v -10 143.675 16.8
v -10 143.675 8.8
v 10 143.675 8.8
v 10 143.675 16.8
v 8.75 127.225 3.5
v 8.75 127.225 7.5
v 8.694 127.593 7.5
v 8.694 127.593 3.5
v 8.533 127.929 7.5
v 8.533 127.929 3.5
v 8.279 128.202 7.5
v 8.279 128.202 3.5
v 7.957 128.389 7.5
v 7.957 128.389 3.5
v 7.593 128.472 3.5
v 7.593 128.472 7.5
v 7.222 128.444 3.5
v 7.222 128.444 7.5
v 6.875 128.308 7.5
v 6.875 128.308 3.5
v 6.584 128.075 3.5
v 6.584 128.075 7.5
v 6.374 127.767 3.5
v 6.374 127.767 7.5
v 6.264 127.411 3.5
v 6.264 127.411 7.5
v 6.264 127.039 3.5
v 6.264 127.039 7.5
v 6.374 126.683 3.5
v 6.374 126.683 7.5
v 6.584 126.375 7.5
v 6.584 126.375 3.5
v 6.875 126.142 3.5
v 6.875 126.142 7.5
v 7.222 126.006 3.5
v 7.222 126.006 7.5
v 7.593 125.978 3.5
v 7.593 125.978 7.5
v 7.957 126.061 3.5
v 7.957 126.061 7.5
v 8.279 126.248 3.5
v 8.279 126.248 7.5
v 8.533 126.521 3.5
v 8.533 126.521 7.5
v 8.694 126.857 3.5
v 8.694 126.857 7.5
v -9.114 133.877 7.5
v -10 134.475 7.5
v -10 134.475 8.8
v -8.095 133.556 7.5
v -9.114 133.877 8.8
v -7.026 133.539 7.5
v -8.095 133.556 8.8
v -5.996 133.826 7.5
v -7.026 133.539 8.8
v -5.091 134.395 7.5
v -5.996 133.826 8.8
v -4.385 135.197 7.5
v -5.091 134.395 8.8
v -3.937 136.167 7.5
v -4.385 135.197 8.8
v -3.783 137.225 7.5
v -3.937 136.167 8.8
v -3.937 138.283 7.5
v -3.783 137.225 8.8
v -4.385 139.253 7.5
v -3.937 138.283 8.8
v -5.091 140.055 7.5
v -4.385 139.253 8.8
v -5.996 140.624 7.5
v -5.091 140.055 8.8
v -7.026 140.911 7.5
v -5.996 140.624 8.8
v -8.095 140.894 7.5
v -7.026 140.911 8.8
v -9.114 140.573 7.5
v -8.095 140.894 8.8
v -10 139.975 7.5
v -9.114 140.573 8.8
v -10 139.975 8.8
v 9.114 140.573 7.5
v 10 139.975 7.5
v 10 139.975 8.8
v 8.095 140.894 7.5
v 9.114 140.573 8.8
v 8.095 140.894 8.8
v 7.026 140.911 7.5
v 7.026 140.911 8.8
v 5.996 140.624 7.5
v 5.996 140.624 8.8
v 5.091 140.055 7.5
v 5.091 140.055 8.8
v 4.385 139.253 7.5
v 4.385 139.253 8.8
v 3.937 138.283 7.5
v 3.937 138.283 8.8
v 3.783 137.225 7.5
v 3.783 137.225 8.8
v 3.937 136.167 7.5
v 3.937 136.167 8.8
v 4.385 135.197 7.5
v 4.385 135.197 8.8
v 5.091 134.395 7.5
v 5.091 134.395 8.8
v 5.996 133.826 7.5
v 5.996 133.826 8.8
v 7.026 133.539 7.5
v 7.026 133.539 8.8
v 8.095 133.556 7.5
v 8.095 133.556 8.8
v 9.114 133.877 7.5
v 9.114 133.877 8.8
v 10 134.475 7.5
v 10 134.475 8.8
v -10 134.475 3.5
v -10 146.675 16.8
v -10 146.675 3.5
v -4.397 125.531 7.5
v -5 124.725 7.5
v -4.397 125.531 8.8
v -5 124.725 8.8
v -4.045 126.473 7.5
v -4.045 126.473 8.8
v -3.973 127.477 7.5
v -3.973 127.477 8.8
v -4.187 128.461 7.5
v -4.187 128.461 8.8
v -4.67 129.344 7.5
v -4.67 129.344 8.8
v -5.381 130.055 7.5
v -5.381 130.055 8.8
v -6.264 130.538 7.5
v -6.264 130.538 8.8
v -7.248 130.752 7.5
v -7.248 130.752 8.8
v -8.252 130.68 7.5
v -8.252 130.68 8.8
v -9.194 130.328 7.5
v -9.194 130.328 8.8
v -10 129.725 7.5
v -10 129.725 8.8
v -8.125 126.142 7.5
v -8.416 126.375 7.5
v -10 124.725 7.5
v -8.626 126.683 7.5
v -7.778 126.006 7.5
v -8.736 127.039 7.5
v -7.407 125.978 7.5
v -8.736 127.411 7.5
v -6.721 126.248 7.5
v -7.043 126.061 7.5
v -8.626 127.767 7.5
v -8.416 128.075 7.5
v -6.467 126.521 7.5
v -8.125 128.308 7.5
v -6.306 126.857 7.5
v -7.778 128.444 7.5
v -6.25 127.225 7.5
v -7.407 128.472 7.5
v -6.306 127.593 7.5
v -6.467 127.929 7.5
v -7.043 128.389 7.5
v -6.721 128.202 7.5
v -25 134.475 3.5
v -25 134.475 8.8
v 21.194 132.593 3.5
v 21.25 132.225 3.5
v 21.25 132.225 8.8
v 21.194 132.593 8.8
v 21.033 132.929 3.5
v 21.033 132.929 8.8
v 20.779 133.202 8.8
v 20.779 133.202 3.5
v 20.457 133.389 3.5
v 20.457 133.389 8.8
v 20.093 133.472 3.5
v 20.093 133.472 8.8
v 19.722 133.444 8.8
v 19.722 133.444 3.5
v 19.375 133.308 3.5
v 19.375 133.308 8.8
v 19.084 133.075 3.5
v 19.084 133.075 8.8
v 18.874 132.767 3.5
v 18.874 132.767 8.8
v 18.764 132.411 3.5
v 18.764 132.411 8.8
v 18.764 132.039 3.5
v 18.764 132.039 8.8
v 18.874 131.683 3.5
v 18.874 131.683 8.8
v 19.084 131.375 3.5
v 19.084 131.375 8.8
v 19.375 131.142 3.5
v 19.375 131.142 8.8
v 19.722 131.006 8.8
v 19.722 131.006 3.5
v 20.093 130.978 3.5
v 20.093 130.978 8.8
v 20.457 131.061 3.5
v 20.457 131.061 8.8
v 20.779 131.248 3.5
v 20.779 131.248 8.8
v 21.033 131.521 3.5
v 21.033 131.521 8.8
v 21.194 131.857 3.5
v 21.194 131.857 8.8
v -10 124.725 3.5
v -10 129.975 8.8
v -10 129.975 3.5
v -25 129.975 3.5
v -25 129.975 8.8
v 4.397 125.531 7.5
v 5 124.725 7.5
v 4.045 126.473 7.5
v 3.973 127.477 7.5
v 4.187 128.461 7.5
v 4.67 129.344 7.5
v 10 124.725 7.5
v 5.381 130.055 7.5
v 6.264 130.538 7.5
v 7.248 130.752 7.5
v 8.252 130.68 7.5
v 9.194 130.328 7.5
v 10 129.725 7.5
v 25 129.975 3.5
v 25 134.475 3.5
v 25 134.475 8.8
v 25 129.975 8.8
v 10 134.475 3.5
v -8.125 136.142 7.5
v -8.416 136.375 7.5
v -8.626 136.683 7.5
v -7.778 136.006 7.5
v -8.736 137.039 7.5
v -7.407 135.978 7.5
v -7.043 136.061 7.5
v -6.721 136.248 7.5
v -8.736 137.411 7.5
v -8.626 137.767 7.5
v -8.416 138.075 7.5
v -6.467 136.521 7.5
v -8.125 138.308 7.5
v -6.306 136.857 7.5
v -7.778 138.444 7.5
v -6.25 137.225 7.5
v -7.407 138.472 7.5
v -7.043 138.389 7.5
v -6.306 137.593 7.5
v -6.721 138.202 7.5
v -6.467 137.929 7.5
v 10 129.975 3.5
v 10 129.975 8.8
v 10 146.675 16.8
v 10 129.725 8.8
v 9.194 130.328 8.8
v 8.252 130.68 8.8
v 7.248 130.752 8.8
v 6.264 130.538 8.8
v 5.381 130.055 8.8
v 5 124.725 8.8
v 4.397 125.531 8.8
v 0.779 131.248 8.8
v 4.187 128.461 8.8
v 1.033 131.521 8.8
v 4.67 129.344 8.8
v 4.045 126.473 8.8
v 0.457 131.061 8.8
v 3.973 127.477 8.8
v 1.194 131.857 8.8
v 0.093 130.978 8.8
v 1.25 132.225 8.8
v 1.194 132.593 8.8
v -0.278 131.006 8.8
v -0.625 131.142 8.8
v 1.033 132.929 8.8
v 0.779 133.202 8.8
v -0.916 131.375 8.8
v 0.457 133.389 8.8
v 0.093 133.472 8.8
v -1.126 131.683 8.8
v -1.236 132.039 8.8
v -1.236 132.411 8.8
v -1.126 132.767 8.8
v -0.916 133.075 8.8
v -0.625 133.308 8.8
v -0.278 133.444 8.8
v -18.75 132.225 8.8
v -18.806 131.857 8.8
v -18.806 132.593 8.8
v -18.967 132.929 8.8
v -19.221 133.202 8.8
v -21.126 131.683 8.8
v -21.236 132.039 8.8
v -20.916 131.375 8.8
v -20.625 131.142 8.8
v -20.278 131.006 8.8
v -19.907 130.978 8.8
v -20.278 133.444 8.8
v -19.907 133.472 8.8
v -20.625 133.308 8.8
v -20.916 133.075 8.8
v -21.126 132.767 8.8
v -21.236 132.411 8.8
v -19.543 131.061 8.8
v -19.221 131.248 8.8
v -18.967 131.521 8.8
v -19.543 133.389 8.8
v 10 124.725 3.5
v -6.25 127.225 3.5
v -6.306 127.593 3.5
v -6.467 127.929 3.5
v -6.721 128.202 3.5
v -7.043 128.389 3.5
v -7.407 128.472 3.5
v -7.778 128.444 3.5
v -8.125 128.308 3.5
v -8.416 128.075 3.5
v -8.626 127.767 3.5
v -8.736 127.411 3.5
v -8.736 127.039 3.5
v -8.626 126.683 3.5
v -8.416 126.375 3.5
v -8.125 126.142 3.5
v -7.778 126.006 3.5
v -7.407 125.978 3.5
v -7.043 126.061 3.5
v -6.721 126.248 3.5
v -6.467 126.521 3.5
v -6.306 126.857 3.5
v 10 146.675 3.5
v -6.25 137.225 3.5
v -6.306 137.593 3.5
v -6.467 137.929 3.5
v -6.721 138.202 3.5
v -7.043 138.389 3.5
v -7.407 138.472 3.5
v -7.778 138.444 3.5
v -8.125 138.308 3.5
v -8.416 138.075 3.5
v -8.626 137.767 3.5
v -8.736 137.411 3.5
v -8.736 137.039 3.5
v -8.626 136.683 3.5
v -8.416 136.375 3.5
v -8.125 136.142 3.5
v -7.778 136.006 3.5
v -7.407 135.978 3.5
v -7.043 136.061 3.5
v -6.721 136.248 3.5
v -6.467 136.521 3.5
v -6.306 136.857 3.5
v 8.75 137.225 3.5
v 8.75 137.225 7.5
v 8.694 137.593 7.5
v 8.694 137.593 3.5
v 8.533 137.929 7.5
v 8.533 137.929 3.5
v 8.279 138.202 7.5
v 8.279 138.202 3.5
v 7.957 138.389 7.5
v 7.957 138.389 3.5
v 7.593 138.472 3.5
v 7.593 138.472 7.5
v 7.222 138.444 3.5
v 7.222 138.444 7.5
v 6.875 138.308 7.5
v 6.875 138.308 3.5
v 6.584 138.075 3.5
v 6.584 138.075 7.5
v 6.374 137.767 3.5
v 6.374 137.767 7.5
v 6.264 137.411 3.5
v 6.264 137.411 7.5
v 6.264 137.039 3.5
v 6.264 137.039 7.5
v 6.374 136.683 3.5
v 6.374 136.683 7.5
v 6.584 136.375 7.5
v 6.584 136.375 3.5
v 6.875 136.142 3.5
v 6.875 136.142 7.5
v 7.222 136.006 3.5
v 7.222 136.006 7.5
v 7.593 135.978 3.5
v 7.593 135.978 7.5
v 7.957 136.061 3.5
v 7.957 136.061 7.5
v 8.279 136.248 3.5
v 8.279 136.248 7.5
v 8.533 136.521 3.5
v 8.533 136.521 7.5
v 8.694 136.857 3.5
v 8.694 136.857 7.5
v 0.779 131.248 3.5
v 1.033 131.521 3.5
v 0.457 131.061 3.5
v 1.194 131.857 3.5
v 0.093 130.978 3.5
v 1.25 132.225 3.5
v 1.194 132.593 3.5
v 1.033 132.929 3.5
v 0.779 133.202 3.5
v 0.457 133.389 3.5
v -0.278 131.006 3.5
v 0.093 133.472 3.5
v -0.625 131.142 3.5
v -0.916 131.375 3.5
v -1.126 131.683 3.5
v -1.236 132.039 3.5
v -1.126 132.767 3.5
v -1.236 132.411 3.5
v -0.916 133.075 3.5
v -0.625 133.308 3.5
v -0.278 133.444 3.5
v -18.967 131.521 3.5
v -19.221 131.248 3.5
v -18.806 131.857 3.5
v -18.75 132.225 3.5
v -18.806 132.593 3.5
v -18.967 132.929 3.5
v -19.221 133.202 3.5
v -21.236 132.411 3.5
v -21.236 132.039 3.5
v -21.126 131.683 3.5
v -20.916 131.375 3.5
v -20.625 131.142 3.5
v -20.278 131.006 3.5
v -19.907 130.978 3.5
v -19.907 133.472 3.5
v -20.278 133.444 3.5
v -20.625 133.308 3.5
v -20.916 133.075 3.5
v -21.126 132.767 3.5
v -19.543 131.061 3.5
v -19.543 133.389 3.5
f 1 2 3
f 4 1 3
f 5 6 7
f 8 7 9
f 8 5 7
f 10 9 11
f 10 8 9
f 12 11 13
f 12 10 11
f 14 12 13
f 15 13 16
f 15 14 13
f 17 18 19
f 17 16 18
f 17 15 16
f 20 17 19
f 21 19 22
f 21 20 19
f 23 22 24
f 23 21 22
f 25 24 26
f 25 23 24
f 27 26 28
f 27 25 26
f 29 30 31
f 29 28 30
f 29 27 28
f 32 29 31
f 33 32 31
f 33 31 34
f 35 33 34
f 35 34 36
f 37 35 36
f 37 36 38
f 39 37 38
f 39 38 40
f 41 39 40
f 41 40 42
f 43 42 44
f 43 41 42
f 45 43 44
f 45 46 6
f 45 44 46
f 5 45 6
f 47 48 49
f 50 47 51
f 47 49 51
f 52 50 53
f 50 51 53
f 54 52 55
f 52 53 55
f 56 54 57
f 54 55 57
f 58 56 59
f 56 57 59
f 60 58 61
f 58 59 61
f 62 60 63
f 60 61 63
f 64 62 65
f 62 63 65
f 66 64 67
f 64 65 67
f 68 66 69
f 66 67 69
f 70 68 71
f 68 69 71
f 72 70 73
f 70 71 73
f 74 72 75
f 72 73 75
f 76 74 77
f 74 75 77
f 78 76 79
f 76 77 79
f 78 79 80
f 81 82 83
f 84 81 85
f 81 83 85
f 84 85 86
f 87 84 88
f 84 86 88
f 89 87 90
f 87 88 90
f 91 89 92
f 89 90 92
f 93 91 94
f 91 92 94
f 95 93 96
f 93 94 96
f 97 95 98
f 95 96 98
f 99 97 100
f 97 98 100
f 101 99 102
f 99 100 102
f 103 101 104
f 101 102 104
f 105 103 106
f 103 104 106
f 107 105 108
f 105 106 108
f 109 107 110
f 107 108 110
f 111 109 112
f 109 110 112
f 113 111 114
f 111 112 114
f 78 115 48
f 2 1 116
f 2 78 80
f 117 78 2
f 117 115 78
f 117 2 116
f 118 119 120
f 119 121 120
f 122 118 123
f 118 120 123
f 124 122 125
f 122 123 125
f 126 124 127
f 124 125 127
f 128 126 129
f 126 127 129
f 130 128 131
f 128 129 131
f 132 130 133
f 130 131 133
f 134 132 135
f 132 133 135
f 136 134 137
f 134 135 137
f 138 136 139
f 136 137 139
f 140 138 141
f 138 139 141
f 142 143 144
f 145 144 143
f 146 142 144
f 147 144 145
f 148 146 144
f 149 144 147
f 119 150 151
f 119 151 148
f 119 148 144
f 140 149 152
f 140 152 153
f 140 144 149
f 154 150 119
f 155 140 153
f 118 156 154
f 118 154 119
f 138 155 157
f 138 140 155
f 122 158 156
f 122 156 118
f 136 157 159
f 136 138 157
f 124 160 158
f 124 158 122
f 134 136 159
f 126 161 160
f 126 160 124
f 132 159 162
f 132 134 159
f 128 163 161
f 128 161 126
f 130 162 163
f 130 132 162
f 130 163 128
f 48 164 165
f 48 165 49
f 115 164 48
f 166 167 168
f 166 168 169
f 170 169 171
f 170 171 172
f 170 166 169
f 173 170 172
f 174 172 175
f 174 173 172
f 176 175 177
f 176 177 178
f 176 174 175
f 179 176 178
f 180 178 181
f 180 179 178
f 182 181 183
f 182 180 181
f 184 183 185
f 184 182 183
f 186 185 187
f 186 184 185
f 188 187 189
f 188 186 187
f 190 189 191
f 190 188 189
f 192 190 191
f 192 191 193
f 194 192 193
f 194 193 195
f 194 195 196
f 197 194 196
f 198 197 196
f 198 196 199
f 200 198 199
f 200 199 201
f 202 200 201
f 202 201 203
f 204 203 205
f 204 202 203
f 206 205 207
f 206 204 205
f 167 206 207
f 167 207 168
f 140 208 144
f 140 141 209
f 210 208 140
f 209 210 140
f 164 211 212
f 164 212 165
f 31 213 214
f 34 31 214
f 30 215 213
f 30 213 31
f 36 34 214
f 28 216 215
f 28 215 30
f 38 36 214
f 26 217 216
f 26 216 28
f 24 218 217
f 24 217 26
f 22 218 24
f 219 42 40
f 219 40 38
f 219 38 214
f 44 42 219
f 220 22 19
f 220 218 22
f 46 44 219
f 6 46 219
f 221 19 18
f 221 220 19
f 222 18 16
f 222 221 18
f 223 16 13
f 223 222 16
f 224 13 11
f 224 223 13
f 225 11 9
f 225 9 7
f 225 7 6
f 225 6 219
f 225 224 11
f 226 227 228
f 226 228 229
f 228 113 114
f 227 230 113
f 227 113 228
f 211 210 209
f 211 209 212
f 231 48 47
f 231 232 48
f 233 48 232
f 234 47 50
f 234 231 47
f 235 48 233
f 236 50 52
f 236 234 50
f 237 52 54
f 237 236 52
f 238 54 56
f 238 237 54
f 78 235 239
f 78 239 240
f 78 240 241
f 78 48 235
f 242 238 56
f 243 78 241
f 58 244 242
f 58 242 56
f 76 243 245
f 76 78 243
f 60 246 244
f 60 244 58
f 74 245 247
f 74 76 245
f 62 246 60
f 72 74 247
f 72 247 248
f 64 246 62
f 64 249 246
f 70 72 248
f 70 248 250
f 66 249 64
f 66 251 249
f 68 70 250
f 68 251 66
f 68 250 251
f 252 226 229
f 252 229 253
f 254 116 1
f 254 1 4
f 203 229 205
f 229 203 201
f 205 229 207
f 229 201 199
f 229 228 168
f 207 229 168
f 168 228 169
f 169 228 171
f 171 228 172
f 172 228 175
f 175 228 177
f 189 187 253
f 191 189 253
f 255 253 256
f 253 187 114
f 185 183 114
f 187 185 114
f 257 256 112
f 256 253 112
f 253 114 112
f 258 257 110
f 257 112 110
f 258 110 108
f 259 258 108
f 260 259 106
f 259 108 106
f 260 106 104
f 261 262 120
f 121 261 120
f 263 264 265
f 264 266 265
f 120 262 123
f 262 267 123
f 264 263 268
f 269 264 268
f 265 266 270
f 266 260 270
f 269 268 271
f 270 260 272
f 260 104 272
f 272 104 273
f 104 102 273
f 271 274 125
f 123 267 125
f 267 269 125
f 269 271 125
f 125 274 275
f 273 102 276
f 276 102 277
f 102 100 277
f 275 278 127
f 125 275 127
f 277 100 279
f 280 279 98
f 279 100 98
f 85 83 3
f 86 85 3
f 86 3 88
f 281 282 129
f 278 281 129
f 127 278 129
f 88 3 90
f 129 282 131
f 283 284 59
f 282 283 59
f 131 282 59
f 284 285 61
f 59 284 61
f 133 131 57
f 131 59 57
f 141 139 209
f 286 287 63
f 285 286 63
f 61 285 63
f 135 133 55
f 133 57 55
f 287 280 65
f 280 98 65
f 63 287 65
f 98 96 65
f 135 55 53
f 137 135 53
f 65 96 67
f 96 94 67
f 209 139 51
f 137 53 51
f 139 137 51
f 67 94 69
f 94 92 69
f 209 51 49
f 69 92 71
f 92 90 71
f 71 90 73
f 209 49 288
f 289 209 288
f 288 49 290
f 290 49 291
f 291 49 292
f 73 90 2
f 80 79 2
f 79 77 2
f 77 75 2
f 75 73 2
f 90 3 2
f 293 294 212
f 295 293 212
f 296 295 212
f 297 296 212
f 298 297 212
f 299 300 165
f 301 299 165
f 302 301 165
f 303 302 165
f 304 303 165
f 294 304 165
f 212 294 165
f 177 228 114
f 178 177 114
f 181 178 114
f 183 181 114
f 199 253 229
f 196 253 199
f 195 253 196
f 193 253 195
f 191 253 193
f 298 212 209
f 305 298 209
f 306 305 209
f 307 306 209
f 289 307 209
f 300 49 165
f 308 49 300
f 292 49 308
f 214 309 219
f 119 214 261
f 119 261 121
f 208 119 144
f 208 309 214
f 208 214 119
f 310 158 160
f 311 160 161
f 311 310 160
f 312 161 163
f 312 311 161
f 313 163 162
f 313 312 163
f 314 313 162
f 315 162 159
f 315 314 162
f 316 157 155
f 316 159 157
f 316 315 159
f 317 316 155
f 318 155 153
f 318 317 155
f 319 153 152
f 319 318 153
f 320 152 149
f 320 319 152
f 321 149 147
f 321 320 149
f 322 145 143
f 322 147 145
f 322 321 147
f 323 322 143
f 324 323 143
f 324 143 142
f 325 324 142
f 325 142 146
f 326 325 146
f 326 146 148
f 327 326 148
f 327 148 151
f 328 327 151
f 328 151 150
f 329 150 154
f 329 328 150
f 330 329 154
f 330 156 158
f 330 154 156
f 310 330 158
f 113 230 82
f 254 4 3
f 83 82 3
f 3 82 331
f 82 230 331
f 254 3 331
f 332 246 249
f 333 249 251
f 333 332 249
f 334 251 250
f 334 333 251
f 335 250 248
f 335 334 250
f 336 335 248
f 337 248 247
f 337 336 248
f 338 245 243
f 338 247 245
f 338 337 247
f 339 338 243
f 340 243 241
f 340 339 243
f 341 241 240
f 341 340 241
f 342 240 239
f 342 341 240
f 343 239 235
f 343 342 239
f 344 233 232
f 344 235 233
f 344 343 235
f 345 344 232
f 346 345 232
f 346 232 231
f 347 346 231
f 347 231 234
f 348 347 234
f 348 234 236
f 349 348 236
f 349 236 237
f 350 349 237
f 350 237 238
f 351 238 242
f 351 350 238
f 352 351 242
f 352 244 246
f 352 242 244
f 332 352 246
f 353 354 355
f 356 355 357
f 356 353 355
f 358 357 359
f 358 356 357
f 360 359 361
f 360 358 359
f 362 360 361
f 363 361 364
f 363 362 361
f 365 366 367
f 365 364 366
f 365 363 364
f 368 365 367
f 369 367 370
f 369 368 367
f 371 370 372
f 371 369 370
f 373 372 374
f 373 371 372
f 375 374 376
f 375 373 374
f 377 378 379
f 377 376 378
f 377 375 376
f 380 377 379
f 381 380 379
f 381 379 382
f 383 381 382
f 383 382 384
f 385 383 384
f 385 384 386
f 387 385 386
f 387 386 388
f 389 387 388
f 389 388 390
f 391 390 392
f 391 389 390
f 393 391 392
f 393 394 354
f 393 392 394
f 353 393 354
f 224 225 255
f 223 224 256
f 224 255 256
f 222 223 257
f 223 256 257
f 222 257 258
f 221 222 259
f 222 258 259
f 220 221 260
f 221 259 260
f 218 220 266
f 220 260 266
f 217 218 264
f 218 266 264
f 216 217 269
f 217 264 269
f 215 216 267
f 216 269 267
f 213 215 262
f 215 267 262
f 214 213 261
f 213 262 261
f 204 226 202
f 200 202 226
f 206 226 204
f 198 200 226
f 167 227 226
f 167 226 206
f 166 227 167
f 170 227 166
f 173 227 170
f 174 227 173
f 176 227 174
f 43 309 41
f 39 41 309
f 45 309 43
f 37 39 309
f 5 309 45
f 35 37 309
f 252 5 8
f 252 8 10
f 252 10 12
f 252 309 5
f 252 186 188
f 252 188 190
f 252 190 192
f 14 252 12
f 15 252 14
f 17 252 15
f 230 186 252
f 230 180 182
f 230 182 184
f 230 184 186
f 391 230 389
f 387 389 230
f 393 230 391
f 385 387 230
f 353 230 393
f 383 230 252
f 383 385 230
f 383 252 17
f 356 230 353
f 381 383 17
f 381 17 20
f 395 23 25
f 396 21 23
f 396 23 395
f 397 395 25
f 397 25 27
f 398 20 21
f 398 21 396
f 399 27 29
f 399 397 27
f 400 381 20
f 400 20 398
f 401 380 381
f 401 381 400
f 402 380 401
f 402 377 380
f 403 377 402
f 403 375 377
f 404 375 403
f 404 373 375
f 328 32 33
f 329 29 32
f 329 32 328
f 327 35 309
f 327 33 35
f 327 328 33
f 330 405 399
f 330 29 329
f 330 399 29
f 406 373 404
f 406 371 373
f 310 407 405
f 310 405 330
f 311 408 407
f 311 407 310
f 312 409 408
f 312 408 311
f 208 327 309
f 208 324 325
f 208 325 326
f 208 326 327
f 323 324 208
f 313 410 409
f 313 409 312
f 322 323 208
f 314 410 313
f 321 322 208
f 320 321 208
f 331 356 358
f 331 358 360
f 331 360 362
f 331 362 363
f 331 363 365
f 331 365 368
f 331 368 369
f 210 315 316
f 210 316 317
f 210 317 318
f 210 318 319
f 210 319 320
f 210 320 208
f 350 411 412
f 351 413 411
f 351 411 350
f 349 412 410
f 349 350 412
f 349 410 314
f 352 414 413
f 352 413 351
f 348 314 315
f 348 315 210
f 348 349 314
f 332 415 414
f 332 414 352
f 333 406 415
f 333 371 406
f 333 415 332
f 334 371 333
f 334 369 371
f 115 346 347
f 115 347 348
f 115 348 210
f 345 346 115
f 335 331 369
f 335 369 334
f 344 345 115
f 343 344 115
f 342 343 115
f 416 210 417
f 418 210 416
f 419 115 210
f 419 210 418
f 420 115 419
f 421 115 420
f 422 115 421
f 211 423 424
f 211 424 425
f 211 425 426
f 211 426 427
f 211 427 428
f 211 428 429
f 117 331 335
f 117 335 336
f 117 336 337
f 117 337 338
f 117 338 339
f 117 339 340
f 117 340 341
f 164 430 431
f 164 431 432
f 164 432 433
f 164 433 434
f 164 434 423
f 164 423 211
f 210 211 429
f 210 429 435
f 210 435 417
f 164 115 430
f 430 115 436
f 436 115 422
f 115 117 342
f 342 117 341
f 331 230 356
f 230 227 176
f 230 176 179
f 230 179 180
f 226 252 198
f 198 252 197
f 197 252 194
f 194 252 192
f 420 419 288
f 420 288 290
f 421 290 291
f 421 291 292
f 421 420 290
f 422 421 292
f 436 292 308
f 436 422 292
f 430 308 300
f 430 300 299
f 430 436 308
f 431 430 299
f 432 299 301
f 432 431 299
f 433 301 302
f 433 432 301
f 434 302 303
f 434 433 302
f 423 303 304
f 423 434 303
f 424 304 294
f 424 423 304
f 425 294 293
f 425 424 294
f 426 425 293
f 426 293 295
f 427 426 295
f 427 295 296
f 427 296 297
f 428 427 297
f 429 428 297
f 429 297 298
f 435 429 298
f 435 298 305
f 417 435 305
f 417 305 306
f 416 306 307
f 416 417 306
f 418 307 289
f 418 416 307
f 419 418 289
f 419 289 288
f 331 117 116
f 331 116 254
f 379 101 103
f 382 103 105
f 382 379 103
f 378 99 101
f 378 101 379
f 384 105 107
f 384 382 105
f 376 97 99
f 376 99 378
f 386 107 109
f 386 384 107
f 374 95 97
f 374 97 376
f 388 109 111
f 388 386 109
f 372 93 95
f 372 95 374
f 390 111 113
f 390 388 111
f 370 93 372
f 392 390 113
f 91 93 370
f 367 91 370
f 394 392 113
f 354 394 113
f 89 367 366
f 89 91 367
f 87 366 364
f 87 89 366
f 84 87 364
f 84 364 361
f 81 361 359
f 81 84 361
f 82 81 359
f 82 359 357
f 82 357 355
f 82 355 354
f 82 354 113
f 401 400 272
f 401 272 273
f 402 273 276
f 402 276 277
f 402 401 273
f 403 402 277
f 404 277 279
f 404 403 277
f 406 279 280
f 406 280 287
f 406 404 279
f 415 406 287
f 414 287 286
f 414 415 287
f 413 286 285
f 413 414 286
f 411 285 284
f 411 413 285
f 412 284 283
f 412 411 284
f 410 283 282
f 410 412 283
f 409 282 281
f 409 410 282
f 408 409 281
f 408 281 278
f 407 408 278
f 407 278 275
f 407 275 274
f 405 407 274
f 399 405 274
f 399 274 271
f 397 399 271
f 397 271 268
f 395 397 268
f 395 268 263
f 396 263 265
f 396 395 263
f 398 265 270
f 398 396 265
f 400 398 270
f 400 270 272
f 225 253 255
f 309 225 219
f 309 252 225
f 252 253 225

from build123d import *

# Parameters (mm, degrees)
SKETCH027_R     = 1.25
PAD016_DEPTH    = 5.3
SKETCH028_R     = 3.535534
SKETCH028_R_2   = 3.716517
POCKET008_DEPTH = 1.3
SKETCH032_W     = 20
SKETCH032_H     = 3
PAD019_DEPTH    = 8


with BuildPart() as part:
    # Sketch027 (on Face1 of ReferencePad002001) → Pad016 (new body)
    with BuildSketch(Plane.XY.offset(3.5)):
        Polygon((10, 124.725), (-10, 124.725), (-10, 129.975), (-25, 129.975), (-25, 134.475), (-10, 134.475), (-10, 139.725), (-10, 146.675), (10, 146.675), (10, 139.725), (10, 134.475), (25, 134.475), (25, 129.975), (10, 129.975), align=None)
        with Locations((7.5, 137.225)):
            Circle(SKETCH027_R, mode=Mode.SUBTRACT)
        with Locations((7.5, 127.225)):
            Circle(SKETCH027_R, mode=Mode.SUBTRACT)
        with Locations((-7.5, 127.225)):
            Circle(SKETCH027_R, mode=Mode.SUBTRACT)
        with Locations((-7.5, 137.225)):
            Circle(SKETCH027_R, mode=Mode.SUBTRACT)
        with Locations((-20, 132.225)):
            Circle(SKETCH027_R, mode=Mode.SUBTRACT)
        with Locations((0, 132.225)):
            Circle(SKETCH027_R, mode=Mode.SUBTRACT)
        with Locations((20, 132.225)):
            Circle(SKETCH027_R, mode=Mode.SUBTRACT)
    extrude(amount=PAD016_DEPTH)

    # Sketch028 (on Face23 of Pad016) → Pocket008 (cut)
    with BuildSketch(Plane.XY.offset(8.8)):
        with Locations((-7.5, 127.225)):
            Circle(SKETCH028_R)
        with Locations((7.5, 127.225)):
            Circle(SKETCH028_R)
        with Locations((-7.5, 137.225)):
            Circle(SKETCH028_R_2)
        with Locations((7.5, 137.225)):
            Circle(SKETCH028_R_2)
    extrude(amount=-POCKET008_DEPTH, mode=Mode.SUBTRACT)

    # Sketch032 (on Face6 of Pocket008) → Pad019 (join)
    with BuildSketch(Plane.XY.offset(8.8)):
        with Locations((0, 145.175)):
            Rectangle(SKETCH032_W, SKETCH032_H)
    extrude(amount=PAD019_DEPTH)


solid = part.part
